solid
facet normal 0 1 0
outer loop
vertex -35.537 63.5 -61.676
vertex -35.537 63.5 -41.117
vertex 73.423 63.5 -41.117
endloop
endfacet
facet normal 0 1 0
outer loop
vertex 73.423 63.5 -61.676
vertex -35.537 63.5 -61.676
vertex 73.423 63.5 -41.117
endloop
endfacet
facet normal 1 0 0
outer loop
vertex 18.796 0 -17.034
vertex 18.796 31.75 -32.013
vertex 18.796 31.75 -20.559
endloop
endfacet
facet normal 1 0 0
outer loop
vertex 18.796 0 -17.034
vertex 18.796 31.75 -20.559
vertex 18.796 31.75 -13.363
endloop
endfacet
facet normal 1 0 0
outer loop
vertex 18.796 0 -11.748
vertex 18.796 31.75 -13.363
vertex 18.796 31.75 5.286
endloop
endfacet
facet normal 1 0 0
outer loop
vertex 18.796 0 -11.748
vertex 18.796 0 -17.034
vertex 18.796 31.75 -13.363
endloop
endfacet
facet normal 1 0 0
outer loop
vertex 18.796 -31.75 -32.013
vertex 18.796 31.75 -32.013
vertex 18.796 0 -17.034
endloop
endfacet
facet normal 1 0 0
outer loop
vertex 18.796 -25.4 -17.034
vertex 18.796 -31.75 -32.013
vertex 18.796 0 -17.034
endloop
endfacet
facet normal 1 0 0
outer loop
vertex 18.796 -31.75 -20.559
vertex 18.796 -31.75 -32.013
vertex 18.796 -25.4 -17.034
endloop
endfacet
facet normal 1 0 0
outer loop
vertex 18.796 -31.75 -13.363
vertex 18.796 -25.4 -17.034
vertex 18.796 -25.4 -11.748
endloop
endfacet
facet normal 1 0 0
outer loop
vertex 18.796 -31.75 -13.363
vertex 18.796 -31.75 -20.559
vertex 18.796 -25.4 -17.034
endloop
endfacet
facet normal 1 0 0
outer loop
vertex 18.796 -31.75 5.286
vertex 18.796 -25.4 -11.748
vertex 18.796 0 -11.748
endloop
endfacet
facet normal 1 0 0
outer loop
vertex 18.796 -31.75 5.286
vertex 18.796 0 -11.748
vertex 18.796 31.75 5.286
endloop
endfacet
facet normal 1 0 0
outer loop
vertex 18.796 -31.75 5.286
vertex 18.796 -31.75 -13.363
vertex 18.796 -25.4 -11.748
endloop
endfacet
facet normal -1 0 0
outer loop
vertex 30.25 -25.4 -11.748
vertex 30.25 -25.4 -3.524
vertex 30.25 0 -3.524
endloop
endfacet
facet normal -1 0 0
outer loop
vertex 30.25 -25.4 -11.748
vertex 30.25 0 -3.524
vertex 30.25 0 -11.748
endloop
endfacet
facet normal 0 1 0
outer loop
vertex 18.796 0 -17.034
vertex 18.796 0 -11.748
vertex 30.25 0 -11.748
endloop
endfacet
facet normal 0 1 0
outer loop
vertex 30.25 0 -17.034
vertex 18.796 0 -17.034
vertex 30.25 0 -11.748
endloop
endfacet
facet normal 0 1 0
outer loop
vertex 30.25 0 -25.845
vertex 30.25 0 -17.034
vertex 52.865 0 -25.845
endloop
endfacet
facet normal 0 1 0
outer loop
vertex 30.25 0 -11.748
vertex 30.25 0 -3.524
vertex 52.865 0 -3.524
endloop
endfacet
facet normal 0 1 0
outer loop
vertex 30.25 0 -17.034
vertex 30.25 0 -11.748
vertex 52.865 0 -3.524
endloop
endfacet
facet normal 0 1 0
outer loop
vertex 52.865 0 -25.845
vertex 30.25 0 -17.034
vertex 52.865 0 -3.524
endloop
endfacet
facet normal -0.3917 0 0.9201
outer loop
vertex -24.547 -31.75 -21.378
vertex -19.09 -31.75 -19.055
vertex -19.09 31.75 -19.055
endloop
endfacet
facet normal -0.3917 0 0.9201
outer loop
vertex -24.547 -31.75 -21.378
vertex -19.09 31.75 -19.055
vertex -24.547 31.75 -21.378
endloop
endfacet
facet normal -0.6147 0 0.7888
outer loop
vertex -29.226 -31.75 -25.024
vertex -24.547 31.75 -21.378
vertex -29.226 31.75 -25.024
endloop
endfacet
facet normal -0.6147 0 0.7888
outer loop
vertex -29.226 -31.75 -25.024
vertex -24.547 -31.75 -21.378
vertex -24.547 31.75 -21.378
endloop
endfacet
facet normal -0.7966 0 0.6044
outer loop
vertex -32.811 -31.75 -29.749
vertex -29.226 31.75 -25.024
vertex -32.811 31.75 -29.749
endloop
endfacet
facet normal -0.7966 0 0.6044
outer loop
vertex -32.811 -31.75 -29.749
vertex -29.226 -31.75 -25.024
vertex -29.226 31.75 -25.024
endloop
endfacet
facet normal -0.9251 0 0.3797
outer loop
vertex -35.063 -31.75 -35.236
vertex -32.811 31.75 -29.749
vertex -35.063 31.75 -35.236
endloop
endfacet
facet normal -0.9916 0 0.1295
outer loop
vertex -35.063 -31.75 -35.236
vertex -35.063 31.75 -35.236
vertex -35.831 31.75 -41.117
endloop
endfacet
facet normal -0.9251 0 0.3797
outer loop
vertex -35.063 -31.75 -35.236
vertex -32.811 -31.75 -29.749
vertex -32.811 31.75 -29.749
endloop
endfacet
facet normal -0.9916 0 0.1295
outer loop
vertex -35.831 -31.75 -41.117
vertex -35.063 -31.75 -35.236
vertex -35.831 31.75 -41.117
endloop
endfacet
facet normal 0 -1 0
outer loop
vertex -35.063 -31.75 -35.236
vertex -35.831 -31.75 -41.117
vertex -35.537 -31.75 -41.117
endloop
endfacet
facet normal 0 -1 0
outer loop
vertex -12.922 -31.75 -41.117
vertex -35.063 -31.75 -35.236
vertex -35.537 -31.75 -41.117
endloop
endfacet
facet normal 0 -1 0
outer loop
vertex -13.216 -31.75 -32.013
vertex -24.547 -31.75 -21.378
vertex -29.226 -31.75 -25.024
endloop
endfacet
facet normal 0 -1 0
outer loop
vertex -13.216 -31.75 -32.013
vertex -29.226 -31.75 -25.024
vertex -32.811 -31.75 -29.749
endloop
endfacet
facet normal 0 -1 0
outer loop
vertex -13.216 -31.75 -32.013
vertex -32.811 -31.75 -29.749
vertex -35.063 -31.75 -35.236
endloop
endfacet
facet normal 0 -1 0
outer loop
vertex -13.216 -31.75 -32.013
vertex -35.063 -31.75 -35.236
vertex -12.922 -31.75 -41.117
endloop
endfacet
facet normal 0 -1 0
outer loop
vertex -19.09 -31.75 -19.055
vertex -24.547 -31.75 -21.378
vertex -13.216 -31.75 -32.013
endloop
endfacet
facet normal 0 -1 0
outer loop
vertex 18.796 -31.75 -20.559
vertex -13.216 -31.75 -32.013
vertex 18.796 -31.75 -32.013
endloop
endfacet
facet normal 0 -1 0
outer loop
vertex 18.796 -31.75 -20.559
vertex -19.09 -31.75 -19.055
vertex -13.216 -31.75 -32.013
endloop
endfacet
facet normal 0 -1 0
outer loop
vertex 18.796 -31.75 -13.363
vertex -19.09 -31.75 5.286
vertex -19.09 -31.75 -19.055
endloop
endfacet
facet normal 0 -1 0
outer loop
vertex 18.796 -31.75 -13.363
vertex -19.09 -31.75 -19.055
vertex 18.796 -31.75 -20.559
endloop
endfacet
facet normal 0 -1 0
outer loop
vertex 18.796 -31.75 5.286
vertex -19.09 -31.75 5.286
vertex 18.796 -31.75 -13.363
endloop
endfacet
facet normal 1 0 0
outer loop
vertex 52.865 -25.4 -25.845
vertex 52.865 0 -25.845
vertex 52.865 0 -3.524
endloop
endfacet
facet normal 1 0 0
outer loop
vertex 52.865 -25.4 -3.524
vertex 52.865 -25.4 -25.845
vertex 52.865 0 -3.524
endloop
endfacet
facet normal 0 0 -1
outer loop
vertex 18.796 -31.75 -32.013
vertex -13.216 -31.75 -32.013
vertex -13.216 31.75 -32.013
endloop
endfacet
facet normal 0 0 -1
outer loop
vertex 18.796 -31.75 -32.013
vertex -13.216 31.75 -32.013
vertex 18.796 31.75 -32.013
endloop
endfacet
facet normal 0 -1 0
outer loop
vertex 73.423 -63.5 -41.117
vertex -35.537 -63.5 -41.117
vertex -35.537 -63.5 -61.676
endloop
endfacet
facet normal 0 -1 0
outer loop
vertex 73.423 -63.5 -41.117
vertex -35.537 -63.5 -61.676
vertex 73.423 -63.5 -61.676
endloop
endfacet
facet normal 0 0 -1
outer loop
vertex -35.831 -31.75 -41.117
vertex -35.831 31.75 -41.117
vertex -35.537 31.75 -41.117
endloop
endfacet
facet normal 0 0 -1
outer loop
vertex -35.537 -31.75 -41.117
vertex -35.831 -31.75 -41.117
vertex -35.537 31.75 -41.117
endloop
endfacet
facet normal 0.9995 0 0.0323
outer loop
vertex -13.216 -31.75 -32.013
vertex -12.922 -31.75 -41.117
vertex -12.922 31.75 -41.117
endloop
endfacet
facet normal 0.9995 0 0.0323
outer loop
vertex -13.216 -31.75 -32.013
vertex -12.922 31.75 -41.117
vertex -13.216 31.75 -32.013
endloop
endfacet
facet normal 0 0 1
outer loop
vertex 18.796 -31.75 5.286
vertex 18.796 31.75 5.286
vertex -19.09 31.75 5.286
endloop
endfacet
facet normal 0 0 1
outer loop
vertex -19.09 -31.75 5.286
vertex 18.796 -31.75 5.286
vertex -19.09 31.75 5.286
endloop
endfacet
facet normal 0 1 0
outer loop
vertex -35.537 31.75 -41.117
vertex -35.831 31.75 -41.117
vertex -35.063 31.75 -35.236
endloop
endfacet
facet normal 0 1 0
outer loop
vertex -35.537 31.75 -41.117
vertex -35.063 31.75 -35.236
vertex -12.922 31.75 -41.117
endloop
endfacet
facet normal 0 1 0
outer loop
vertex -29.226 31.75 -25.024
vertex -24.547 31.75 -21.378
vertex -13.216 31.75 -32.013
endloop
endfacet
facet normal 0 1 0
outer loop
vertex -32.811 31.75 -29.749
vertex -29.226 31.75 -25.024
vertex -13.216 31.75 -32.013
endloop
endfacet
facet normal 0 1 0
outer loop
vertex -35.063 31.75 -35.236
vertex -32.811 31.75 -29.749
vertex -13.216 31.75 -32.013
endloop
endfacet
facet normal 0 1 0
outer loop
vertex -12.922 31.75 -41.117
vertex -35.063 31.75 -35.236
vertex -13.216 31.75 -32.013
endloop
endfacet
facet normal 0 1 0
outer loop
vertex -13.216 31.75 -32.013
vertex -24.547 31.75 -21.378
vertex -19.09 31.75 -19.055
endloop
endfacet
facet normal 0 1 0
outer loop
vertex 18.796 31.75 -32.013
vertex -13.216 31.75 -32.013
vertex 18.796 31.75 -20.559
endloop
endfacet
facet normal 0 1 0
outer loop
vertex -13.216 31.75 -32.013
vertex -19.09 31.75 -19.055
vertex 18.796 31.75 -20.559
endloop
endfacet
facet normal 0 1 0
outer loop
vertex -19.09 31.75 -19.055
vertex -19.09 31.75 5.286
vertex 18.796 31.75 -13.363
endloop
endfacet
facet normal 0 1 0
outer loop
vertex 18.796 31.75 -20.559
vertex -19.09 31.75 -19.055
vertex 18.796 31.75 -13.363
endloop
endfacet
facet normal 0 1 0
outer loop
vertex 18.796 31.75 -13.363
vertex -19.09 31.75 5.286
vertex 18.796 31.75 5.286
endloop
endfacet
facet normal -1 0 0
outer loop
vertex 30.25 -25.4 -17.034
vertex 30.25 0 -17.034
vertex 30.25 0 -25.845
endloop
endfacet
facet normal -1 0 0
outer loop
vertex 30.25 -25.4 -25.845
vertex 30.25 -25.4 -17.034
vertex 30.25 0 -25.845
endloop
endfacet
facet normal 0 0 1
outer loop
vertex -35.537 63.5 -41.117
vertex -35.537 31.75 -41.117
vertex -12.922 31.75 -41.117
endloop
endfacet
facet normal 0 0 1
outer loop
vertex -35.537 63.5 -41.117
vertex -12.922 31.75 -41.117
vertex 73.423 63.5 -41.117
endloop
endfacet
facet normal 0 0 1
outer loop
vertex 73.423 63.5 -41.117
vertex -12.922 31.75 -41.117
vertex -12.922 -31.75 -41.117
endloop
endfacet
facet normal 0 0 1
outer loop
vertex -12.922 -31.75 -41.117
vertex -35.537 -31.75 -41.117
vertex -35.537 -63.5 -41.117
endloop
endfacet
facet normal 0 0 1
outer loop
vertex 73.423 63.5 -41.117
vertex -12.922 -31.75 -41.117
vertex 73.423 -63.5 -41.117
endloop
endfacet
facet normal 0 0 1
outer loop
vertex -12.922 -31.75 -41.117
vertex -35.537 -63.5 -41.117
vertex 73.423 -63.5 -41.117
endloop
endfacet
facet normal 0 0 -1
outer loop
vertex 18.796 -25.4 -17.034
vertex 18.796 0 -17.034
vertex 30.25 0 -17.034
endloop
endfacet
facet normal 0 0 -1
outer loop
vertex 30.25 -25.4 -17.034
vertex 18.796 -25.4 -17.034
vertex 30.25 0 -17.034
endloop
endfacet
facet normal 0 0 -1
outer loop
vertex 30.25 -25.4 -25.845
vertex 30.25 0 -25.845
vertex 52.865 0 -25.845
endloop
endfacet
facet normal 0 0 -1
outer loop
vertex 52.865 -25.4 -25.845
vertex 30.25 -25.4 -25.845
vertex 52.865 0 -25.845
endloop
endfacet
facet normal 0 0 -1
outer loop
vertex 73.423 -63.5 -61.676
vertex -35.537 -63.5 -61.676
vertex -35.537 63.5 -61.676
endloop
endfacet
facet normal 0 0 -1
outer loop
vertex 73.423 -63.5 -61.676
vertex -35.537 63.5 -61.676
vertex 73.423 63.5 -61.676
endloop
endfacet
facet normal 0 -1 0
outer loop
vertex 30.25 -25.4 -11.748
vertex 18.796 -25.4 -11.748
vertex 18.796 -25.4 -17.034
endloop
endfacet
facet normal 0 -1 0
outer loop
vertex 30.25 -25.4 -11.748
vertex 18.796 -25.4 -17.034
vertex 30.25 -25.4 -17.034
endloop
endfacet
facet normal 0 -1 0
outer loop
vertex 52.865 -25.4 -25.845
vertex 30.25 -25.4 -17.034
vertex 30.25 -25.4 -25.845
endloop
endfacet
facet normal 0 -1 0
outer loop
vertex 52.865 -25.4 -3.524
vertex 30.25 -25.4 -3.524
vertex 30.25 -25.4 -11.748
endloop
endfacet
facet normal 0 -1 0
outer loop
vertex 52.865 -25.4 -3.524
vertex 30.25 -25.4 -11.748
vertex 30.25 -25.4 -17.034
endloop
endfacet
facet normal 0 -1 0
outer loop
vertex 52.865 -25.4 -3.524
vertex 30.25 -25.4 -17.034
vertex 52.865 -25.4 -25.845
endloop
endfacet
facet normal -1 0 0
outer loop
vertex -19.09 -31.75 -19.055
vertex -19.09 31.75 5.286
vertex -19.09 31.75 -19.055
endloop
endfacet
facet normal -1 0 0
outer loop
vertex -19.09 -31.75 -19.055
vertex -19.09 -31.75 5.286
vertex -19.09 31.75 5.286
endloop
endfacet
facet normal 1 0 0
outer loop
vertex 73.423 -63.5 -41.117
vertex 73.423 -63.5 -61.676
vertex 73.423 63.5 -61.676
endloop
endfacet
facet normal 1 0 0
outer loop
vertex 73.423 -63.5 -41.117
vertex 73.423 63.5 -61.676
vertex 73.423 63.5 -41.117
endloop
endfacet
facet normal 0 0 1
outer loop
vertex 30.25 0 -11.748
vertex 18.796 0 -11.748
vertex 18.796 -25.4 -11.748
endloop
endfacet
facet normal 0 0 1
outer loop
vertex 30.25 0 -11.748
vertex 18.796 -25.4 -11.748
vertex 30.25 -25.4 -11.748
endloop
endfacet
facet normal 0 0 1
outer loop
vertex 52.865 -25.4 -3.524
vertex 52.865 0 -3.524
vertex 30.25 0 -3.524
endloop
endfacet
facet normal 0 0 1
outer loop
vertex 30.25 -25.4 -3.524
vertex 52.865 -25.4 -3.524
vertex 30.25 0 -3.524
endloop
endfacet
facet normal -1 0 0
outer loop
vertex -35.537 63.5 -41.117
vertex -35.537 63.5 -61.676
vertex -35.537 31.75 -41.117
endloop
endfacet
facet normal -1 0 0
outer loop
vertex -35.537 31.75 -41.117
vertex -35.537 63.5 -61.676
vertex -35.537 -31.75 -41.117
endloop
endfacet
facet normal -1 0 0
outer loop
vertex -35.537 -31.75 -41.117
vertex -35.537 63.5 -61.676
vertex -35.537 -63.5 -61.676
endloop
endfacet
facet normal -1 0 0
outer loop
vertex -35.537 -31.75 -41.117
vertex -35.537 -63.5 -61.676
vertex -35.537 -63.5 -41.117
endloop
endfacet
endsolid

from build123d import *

# Parameters (mm, degrees)
F0_W     = 8.2234106958
F0_H     = 7.1954836603
F1_DEPTH = 31.75
F2_W     = 108.9601889253
F2_H     = 20.5585248768
F3_DEPTH = 63.5
F4_W     = 13.2161937654
F4_H     = 5.2864775062
F4_W_2   = 0.5873870105
F5_DEPTH = 25.4


with BuildPart() as f1:
    # F0 (on Front) → F1 (new body, symmetric)
    with BuildSketch(Plane.XZ):
        Polygon((-19.0900564194, 5.2864807658), (-19.0900564194, -19.0548436975), (-19.0900564194, -32.0125594735), (-13.2161900401, -32.0125594735), (18.796371296, -32.0125594735), (18.796371296, -20.5585230142), (10.5729606003, -20.5585230142), (10.5729606003, -13.3630393539), (18.796371296, -13.3630393539), (18.796371296, 5.2864807658), align=None)
        with Locations((14.6846659482, -16.960781184)):
            Rectangle(F0_W, F0_H)
        with BuildLine():
            ThreePointArc((-19.0900564194, -19.0548436975), (-31.1716974247, -27.2697965826), (-35.8305685222, -41.1170497537))
            Line((-35.8305685222, -41.1170497537), (-12.9224974662, -41.1170497537))
            Line((-12.9224974662, -41.1170497537), (-13.2161900401, -32.0125594735))
            Line((-13.2161900401, -32.0125594735), (-19.0900564194, -32.0125594735))
            Line((-19.0900564194, -32.0125594735), (-19.0900564194, -19.0548436975))
        make_face()
    extrude(amount=F1_DEPTH, both=True)

    # F2 (on Front) → F3 (join, symmetric)
    with BuildSketch(Plane.XZ):
        with Locations((18.9432166517, -51.3963121921)):
            Rectangle(F2_W, F2_H)
    extrude(amount=F3_DEPTH, both=True)

    # F4 (on Front) → F5 (join)
    with BuildSketch(Plane.XZ):
        with Locations((23.6423071474, -14.3909677863)):
            Rectangle(F4_W, F4_H)
        Polygon((30.2504040301, -3.5243185703), (30.2504040301, -11.7477290332), (30.8377910405, -11.7477290332), (30.8377910405, -17.0342065394), (30.2504040301, -17.0342065394), (30.2504040301, -25.845002383), (52.8647787869, -25.845002383), (52.8647787869, -3.5243185703), align=None)
        with Locations((30.5440975353, -14.3909677863)):
            Rectangle(F4_W_2, F4_H)
    extrude(amount=F5_DEPTH)


solid = f1.part
